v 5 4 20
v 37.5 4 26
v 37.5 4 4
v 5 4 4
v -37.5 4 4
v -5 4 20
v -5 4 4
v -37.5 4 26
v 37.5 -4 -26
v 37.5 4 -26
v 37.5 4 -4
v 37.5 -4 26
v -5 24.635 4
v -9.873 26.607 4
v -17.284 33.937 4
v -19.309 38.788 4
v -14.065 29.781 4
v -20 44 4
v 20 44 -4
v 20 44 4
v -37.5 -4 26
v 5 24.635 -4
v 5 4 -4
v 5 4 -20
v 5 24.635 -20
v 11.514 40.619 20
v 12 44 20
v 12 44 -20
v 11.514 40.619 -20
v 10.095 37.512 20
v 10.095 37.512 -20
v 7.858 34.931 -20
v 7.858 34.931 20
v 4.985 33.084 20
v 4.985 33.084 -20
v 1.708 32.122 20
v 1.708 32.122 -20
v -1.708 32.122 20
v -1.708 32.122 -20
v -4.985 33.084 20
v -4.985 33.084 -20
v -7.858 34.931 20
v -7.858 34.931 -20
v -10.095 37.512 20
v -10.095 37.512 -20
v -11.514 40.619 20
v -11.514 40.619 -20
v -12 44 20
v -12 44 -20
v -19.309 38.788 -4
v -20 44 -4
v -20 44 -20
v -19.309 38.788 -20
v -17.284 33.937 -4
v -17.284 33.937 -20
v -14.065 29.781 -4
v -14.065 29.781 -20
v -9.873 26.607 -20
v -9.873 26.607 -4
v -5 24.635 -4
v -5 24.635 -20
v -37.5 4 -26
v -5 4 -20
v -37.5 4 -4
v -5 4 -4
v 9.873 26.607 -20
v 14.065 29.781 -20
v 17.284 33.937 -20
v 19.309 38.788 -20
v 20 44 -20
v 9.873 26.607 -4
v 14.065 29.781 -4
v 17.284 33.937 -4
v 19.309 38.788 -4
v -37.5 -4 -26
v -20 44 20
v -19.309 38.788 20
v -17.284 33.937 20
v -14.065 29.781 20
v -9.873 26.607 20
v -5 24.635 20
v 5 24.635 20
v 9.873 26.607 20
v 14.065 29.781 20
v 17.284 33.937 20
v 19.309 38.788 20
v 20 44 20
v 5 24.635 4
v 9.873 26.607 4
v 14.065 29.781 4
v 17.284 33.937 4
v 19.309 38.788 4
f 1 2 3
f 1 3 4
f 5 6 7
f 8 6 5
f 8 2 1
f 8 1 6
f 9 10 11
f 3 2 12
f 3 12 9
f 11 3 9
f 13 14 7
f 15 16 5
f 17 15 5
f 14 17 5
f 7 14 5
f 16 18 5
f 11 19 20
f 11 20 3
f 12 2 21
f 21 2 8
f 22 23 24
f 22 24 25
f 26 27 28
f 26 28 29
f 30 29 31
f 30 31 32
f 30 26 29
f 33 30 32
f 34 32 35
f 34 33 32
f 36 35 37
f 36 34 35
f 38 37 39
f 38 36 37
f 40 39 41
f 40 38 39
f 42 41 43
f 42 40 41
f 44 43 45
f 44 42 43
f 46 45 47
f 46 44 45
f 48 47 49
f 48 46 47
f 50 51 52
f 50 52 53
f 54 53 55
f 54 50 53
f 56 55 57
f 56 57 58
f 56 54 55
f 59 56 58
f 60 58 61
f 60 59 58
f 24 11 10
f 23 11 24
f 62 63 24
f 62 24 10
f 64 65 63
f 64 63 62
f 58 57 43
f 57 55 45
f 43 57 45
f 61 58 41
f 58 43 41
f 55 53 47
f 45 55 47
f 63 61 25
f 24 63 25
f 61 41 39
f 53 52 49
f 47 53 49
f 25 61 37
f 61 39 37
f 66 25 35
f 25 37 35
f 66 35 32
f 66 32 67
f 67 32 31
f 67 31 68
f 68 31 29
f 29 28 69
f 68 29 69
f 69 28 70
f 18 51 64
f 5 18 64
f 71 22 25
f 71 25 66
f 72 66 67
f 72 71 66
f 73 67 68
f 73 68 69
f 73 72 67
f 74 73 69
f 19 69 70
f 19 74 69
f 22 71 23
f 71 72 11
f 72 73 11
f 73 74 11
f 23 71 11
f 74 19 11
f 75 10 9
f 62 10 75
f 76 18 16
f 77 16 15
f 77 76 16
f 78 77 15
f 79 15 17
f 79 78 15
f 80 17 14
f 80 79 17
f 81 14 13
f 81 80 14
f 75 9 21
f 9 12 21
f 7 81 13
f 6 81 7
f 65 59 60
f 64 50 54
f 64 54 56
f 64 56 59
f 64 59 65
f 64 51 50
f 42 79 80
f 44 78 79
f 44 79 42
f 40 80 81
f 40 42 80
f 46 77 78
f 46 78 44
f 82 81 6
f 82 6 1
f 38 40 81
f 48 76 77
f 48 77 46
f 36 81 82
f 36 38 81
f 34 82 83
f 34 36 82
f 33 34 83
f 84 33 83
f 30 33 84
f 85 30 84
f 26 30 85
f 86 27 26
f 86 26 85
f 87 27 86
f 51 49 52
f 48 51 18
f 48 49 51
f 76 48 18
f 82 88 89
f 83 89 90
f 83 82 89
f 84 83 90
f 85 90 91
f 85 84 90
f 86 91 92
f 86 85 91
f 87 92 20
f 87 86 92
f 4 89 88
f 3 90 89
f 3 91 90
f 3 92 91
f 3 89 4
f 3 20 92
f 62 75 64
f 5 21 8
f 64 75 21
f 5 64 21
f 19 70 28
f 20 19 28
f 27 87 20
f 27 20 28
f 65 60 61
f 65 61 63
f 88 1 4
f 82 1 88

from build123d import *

# Parameters (mm, degrees)
BOSS_EXTRUDE1_DEPTH = 26
BOSS_EXTRUDE2_DEPTH = 20
RIB1_REACH          = 65.39
SKETCH6_WALL_W      = 172.439958848
SKETCH6_WALL_H      = 8
RIB2_REACH          = 65.39
SKETCH7_WALL_W      = 172.439958848
SKETCH7_WALL_H      = 8


with BuildPart() as part:
    # Sketch2 → Boss-Extrude1 (new, symmetric)
    with BuildSketch(Plane.XY):
        Polygon((-5, 4), (37.5, 4), (37.5, -4), (-37.5, -4), (-37.5, 4), align=None)
    extrude(amount=BOSS_EXTRUDE1_DEPTH, both=True)

    # Sketch2<3> → Boss-Extrude2 (add, symmetric)
    with BuildSketch(Plane.XY):
        with BuildLine():
            Line((-5, 24.635083269), (-5, 4))
            Line((-5, 4), (5, 4))
            Line((5, 4), (5, 24.635083269))
            ThreePointArc((5, 24.635083269), (15.811388301, 31.752551286), (20, 44))
            Line((20, 44), (12, 44))
            ThreePointArc((12, 44), (0, 32), (-12, 44))
            Line((-12, 44), (-20, 44))
            ThreePointArc((-20, 44), (-15.811388301, 31.752551286), (-5, 24.635083269))
        make_face()
    extrude(amount=BOSS_EXTRUDE2_DEPTH, both=True)

    # Sketch6 wall → Rib1 (add, up to next)
    with BuildSketch(Plane(origin=(28.75, 24, 0), x_dir=(0.40081883402, -0.916157334902, 0), z_dir=(0.916157334902, 0.40081883402, 0)), mode=Mode.PRIVATE) as rib1_sk1:
        Rectangle(SKETCH6_WALL_W, SKETCH6_WALL_H)
    rib1_tool1 = extrude(rib1_sk1.sketch, amount=-RIB1_REACH, mode=Mode.PRIVATE) - part.part
    add(rib1_tool1.solids().sort_by_distance((28.75, 24, 0))[0])

    # Sketch7 wall → Rib2 (add, up to next)
    with BuildSketch(Plane(origin=(-28.75, 24, 0), x_dir=(-0.40081883402, -0.916157334902, 0), z_dir=(0.916157334902, -0.40081883402, 0)), mode=Mode.PRIVATE) as rib2_sk1:
        Rectangle(SKETCH7_WALL_W, SKETCH7_WALL_H)
    rib2_tool1 = extrude(rib2_sk1.sketch, amount=RIB2_REACH, mode=Mode.PRIVATE) - part.part
    add(rib2_tool1.solids().sort_by_distance((-28.75, 24, 0))[0])


solid = part.part
